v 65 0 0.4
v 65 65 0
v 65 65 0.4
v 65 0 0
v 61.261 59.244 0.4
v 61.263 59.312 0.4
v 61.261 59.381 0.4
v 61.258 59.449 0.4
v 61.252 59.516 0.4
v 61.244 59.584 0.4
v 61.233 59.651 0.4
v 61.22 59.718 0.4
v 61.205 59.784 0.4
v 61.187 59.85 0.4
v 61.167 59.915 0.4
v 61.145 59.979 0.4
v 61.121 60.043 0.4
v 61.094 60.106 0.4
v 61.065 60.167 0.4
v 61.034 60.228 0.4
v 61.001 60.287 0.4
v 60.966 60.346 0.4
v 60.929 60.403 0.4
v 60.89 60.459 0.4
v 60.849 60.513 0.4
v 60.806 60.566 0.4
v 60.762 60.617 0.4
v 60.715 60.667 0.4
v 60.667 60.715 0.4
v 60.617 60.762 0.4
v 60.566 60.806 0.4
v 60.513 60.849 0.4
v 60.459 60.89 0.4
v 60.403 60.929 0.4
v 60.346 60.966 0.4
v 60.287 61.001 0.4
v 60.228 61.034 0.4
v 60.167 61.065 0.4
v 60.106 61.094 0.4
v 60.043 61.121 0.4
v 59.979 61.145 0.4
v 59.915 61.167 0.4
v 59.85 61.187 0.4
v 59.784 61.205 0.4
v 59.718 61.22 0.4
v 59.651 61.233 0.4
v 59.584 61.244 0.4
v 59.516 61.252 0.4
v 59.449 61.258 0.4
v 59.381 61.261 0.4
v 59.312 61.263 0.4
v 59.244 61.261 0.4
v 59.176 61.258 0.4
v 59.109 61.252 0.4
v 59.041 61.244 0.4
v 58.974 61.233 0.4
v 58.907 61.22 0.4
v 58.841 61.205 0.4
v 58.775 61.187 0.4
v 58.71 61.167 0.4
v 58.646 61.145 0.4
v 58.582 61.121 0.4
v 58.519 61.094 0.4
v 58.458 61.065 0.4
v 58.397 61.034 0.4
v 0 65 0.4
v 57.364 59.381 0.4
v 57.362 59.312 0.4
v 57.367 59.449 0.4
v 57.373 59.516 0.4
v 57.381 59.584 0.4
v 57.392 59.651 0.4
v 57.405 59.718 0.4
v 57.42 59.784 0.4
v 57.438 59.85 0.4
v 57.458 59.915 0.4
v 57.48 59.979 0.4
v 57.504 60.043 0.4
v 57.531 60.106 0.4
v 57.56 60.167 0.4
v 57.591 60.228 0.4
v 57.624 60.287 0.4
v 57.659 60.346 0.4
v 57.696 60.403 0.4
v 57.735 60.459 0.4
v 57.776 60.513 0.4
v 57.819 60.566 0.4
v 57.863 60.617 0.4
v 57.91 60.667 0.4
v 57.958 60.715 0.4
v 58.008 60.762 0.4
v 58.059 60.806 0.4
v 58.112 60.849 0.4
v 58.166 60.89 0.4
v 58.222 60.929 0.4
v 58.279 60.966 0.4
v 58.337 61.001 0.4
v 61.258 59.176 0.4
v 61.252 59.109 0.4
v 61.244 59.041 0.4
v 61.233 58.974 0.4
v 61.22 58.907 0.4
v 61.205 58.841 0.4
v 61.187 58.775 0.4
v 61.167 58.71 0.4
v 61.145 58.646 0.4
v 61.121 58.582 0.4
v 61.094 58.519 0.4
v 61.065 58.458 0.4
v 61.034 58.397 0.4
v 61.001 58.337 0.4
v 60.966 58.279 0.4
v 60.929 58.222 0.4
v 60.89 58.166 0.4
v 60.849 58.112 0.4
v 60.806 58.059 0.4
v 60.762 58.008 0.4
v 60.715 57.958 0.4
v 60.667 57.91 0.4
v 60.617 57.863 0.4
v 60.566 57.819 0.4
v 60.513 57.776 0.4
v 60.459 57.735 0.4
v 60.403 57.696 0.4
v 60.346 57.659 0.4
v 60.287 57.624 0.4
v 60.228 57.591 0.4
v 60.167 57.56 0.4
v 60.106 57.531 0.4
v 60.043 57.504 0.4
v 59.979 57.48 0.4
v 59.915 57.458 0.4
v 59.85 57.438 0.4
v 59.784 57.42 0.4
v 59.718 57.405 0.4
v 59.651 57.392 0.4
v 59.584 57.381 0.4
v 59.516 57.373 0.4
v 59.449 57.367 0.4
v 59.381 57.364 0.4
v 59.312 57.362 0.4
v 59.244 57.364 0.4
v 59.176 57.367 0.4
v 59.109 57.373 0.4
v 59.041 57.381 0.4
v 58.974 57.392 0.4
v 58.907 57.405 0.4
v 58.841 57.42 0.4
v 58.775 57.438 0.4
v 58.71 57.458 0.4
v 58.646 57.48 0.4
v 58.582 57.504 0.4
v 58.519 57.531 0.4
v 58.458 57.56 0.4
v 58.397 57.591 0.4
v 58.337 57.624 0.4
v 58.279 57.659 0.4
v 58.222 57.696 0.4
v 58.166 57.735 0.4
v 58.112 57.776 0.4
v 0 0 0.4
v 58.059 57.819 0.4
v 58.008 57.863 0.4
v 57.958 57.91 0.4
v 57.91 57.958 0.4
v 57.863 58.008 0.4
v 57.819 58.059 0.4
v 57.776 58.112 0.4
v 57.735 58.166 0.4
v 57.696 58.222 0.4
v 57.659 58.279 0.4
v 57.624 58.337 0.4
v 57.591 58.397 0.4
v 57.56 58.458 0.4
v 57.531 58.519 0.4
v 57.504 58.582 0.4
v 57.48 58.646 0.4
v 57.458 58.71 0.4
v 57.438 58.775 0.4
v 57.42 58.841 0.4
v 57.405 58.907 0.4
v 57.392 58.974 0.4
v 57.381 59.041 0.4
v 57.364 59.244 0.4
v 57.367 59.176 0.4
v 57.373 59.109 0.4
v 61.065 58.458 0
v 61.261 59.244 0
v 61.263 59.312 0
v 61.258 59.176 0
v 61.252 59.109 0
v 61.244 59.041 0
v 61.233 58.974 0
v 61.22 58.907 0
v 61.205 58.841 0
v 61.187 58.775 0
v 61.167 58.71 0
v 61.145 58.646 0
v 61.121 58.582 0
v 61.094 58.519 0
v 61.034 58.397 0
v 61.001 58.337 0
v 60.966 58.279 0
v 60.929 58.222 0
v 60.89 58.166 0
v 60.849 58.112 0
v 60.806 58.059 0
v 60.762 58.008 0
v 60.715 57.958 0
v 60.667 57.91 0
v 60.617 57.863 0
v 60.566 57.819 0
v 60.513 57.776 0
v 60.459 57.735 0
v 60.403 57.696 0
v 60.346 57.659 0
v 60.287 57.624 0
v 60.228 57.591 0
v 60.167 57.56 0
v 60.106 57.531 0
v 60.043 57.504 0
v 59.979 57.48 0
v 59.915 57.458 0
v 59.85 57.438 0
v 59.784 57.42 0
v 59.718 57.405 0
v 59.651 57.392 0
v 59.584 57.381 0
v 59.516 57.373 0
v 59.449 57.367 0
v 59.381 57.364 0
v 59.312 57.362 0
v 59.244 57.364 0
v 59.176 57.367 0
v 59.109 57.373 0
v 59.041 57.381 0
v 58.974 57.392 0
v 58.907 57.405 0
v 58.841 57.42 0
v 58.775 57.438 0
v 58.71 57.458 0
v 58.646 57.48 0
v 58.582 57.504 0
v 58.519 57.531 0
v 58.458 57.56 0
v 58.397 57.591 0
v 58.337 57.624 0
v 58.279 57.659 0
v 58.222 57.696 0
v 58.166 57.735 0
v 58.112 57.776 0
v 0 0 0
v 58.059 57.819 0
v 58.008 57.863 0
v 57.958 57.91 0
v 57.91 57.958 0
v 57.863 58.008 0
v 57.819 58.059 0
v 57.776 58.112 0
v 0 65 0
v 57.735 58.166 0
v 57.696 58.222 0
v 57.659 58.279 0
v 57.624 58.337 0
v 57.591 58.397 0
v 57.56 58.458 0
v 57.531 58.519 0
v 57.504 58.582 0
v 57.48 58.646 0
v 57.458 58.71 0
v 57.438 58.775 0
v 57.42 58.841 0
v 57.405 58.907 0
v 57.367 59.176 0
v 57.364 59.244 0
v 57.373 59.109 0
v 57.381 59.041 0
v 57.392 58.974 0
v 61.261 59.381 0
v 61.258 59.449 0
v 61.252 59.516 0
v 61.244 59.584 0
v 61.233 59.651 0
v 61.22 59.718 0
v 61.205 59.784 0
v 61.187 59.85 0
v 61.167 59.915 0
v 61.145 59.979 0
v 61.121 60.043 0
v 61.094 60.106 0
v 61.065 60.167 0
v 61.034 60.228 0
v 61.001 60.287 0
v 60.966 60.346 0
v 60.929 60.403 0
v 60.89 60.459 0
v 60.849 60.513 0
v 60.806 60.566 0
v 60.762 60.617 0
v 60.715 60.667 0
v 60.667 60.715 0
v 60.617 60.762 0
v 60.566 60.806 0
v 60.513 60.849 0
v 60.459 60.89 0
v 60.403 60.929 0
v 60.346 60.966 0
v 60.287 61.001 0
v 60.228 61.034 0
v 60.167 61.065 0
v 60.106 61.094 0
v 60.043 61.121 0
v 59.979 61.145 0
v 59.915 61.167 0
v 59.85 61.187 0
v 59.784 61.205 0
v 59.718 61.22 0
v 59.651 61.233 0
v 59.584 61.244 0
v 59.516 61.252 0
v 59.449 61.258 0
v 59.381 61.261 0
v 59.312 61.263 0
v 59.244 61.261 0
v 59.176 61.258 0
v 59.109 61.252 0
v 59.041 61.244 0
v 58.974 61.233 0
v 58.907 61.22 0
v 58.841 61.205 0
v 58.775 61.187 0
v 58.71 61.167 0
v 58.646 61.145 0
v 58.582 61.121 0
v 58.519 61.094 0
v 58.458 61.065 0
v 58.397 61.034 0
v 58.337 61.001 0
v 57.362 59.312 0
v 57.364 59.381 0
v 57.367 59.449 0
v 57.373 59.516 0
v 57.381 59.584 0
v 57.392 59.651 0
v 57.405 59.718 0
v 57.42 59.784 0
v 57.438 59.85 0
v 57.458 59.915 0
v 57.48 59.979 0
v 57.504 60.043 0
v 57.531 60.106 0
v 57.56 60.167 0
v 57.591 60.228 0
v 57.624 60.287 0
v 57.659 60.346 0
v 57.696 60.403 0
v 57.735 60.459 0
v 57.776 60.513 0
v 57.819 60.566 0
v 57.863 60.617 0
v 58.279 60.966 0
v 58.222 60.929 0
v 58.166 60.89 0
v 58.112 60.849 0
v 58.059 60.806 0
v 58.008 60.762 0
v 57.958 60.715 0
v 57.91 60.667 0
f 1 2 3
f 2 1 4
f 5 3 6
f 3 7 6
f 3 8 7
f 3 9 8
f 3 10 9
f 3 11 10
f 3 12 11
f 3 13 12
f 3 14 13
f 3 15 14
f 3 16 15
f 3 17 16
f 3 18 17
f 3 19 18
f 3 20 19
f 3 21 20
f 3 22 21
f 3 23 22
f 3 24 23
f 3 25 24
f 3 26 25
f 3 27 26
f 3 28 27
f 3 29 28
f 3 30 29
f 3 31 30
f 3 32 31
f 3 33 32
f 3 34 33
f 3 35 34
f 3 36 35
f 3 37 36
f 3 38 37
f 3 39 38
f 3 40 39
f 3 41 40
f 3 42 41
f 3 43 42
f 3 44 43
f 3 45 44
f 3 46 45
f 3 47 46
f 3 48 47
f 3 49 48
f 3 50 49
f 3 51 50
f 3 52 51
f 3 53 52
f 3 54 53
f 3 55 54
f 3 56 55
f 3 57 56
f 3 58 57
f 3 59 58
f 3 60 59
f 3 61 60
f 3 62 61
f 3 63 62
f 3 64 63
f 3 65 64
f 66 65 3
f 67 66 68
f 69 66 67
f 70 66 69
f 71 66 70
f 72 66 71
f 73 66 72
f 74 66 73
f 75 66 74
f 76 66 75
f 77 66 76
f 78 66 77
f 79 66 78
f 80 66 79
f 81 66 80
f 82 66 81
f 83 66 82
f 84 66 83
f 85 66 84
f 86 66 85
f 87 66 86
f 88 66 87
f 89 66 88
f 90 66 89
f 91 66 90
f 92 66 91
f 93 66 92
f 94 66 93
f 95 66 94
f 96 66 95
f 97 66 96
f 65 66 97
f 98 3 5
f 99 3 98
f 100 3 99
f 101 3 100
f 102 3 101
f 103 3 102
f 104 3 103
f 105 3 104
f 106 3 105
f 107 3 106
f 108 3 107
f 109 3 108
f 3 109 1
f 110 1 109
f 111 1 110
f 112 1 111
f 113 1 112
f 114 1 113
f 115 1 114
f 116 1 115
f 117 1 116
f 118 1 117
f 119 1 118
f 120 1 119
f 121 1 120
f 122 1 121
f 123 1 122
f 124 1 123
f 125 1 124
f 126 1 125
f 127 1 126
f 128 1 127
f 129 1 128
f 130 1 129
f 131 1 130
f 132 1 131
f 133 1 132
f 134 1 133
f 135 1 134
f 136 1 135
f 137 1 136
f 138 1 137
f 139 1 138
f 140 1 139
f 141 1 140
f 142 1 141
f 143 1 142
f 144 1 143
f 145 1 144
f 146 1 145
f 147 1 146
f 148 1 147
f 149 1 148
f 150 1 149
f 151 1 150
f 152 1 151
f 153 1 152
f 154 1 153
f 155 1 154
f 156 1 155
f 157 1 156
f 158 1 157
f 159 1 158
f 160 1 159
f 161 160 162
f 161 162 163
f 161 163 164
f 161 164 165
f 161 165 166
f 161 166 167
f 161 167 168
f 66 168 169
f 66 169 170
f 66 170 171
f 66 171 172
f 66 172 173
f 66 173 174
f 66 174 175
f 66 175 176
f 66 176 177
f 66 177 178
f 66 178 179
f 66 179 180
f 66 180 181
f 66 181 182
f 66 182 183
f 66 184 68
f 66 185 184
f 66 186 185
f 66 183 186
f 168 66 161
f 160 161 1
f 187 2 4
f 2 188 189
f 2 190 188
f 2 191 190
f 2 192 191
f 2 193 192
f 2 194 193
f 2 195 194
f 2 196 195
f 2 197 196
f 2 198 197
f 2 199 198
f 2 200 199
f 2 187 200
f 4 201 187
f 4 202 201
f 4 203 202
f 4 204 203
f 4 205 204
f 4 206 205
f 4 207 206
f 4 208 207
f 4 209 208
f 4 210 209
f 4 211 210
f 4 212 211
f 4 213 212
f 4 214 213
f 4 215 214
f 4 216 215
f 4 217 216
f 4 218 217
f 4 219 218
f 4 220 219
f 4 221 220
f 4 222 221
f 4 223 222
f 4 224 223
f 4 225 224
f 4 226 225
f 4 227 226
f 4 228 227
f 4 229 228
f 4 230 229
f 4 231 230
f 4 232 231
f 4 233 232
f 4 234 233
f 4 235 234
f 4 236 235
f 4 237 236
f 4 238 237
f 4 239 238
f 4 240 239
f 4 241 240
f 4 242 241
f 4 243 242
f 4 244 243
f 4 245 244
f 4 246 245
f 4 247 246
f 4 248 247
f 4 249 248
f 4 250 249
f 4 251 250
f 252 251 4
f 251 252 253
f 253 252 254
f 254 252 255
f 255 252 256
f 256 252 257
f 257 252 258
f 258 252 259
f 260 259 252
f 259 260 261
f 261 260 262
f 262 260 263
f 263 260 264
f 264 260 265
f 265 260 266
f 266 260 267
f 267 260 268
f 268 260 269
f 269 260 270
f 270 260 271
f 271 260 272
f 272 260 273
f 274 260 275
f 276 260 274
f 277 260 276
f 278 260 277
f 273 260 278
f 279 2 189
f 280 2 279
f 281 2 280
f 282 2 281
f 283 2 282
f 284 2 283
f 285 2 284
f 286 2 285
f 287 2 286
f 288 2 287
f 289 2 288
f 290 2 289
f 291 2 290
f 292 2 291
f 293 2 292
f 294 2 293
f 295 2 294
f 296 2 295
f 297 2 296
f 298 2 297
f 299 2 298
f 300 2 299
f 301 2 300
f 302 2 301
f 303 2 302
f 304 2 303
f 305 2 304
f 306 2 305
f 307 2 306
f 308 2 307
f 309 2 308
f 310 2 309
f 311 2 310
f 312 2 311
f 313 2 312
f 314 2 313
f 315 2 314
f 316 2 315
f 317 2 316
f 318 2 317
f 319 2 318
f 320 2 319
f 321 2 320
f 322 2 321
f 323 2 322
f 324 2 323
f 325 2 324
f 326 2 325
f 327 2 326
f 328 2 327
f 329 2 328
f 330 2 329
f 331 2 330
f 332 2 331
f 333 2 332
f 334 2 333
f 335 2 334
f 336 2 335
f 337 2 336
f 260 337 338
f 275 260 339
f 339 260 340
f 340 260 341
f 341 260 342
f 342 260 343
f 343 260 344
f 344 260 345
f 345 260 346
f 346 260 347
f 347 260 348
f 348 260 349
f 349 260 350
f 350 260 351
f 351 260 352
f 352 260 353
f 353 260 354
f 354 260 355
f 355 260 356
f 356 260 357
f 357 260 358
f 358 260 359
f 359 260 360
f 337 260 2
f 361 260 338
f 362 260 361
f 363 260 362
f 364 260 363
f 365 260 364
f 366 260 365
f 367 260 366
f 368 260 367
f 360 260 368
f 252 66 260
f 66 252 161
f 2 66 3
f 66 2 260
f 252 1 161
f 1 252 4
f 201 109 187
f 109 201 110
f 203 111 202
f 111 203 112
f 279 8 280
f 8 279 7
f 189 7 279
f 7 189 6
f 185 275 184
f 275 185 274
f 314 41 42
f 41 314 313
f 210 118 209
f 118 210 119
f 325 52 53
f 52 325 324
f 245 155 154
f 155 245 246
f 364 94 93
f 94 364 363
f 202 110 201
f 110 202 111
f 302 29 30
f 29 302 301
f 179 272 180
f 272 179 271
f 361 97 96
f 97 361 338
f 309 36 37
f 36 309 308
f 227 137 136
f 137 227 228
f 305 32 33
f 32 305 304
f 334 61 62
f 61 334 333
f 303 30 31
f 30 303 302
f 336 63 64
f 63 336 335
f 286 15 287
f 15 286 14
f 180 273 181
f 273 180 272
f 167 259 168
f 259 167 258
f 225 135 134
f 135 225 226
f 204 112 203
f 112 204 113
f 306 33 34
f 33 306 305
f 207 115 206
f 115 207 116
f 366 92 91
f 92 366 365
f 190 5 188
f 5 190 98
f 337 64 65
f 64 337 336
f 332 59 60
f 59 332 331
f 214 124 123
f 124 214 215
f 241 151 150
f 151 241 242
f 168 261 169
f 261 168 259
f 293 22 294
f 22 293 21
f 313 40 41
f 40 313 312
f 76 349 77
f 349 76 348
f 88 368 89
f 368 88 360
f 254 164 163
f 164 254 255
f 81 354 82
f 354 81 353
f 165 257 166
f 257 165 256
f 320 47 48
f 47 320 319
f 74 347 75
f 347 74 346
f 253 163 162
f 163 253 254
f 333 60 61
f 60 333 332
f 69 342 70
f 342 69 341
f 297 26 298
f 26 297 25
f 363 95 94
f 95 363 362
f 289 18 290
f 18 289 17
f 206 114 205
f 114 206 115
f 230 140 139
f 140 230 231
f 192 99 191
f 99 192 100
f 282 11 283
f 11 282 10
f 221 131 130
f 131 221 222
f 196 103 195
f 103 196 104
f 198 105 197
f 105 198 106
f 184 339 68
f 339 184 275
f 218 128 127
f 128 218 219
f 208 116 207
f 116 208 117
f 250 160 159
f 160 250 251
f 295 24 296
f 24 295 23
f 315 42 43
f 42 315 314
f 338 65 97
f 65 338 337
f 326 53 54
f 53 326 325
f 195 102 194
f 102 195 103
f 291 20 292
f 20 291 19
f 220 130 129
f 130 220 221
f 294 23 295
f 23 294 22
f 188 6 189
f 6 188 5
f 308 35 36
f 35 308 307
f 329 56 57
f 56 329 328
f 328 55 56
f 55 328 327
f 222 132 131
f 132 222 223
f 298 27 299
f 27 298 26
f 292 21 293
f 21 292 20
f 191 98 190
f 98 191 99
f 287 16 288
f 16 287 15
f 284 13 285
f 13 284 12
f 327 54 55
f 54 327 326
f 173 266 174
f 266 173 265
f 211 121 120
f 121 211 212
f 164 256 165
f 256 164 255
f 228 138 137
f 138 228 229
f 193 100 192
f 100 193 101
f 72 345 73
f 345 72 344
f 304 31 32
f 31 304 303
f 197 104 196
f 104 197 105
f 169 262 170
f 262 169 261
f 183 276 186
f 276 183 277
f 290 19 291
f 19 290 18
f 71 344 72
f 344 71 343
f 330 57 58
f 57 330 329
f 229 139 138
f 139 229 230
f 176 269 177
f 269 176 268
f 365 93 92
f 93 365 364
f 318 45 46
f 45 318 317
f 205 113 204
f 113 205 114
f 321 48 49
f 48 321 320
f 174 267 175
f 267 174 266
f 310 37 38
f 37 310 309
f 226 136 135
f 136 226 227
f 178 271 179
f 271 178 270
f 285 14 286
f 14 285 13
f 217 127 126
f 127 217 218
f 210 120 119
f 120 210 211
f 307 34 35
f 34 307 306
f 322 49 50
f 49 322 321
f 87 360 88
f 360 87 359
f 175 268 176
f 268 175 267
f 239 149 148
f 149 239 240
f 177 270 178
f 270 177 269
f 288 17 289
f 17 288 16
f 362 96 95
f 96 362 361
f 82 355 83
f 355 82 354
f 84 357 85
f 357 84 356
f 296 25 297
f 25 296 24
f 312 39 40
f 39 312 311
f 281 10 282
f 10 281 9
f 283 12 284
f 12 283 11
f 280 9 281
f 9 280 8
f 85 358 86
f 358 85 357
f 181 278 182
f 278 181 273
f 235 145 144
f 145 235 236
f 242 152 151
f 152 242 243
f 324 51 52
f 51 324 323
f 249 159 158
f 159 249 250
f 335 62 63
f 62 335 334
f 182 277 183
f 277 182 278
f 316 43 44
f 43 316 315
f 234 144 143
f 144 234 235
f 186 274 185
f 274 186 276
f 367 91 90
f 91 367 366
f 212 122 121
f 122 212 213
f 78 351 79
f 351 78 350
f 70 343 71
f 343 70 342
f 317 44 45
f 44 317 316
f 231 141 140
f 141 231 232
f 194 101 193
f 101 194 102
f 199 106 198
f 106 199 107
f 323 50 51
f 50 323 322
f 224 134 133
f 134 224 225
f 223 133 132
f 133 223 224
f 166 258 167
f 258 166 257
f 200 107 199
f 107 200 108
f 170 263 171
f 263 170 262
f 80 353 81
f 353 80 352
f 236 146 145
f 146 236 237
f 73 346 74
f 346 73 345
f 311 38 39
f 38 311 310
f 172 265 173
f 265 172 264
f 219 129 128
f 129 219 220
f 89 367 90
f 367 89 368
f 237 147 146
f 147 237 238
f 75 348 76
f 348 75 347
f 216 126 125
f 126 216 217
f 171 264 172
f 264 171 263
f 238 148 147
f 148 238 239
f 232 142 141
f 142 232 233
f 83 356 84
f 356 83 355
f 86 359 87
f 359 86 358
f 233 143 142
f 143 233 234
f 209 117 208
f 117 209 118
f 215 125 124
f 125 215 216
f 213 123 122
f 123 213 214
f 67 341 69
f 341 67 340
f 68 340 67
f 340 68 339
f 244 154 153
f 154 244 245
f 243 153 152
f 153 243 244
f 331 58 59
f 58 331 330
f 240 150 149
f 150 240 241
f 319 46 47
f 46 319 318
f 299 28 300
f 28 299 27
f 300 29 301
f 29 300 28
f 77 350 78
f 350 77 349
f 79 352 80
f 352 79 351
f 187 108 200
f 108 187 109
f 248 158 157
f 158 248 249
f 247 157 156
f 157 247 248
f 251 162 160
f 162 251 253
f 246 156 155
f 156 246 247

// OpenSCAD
$fn = 180;

SIZE = 80;

module base(thickness) {
    difference() {
        cube([SIZE, SIZE, thickness]);
        translate([73, 73, 0]) cylinder( 20, 2.4, 2.4,true);
    }
}

scale([6.5/8, 6.5/8, 1]) {
    difference() {
        base(0.4);
        
        translate([0, 0, -0.5])
        linear_extrude(h=1) 
        scale([10, 10, 1])
        import("Roger.dxf");
    }
}
